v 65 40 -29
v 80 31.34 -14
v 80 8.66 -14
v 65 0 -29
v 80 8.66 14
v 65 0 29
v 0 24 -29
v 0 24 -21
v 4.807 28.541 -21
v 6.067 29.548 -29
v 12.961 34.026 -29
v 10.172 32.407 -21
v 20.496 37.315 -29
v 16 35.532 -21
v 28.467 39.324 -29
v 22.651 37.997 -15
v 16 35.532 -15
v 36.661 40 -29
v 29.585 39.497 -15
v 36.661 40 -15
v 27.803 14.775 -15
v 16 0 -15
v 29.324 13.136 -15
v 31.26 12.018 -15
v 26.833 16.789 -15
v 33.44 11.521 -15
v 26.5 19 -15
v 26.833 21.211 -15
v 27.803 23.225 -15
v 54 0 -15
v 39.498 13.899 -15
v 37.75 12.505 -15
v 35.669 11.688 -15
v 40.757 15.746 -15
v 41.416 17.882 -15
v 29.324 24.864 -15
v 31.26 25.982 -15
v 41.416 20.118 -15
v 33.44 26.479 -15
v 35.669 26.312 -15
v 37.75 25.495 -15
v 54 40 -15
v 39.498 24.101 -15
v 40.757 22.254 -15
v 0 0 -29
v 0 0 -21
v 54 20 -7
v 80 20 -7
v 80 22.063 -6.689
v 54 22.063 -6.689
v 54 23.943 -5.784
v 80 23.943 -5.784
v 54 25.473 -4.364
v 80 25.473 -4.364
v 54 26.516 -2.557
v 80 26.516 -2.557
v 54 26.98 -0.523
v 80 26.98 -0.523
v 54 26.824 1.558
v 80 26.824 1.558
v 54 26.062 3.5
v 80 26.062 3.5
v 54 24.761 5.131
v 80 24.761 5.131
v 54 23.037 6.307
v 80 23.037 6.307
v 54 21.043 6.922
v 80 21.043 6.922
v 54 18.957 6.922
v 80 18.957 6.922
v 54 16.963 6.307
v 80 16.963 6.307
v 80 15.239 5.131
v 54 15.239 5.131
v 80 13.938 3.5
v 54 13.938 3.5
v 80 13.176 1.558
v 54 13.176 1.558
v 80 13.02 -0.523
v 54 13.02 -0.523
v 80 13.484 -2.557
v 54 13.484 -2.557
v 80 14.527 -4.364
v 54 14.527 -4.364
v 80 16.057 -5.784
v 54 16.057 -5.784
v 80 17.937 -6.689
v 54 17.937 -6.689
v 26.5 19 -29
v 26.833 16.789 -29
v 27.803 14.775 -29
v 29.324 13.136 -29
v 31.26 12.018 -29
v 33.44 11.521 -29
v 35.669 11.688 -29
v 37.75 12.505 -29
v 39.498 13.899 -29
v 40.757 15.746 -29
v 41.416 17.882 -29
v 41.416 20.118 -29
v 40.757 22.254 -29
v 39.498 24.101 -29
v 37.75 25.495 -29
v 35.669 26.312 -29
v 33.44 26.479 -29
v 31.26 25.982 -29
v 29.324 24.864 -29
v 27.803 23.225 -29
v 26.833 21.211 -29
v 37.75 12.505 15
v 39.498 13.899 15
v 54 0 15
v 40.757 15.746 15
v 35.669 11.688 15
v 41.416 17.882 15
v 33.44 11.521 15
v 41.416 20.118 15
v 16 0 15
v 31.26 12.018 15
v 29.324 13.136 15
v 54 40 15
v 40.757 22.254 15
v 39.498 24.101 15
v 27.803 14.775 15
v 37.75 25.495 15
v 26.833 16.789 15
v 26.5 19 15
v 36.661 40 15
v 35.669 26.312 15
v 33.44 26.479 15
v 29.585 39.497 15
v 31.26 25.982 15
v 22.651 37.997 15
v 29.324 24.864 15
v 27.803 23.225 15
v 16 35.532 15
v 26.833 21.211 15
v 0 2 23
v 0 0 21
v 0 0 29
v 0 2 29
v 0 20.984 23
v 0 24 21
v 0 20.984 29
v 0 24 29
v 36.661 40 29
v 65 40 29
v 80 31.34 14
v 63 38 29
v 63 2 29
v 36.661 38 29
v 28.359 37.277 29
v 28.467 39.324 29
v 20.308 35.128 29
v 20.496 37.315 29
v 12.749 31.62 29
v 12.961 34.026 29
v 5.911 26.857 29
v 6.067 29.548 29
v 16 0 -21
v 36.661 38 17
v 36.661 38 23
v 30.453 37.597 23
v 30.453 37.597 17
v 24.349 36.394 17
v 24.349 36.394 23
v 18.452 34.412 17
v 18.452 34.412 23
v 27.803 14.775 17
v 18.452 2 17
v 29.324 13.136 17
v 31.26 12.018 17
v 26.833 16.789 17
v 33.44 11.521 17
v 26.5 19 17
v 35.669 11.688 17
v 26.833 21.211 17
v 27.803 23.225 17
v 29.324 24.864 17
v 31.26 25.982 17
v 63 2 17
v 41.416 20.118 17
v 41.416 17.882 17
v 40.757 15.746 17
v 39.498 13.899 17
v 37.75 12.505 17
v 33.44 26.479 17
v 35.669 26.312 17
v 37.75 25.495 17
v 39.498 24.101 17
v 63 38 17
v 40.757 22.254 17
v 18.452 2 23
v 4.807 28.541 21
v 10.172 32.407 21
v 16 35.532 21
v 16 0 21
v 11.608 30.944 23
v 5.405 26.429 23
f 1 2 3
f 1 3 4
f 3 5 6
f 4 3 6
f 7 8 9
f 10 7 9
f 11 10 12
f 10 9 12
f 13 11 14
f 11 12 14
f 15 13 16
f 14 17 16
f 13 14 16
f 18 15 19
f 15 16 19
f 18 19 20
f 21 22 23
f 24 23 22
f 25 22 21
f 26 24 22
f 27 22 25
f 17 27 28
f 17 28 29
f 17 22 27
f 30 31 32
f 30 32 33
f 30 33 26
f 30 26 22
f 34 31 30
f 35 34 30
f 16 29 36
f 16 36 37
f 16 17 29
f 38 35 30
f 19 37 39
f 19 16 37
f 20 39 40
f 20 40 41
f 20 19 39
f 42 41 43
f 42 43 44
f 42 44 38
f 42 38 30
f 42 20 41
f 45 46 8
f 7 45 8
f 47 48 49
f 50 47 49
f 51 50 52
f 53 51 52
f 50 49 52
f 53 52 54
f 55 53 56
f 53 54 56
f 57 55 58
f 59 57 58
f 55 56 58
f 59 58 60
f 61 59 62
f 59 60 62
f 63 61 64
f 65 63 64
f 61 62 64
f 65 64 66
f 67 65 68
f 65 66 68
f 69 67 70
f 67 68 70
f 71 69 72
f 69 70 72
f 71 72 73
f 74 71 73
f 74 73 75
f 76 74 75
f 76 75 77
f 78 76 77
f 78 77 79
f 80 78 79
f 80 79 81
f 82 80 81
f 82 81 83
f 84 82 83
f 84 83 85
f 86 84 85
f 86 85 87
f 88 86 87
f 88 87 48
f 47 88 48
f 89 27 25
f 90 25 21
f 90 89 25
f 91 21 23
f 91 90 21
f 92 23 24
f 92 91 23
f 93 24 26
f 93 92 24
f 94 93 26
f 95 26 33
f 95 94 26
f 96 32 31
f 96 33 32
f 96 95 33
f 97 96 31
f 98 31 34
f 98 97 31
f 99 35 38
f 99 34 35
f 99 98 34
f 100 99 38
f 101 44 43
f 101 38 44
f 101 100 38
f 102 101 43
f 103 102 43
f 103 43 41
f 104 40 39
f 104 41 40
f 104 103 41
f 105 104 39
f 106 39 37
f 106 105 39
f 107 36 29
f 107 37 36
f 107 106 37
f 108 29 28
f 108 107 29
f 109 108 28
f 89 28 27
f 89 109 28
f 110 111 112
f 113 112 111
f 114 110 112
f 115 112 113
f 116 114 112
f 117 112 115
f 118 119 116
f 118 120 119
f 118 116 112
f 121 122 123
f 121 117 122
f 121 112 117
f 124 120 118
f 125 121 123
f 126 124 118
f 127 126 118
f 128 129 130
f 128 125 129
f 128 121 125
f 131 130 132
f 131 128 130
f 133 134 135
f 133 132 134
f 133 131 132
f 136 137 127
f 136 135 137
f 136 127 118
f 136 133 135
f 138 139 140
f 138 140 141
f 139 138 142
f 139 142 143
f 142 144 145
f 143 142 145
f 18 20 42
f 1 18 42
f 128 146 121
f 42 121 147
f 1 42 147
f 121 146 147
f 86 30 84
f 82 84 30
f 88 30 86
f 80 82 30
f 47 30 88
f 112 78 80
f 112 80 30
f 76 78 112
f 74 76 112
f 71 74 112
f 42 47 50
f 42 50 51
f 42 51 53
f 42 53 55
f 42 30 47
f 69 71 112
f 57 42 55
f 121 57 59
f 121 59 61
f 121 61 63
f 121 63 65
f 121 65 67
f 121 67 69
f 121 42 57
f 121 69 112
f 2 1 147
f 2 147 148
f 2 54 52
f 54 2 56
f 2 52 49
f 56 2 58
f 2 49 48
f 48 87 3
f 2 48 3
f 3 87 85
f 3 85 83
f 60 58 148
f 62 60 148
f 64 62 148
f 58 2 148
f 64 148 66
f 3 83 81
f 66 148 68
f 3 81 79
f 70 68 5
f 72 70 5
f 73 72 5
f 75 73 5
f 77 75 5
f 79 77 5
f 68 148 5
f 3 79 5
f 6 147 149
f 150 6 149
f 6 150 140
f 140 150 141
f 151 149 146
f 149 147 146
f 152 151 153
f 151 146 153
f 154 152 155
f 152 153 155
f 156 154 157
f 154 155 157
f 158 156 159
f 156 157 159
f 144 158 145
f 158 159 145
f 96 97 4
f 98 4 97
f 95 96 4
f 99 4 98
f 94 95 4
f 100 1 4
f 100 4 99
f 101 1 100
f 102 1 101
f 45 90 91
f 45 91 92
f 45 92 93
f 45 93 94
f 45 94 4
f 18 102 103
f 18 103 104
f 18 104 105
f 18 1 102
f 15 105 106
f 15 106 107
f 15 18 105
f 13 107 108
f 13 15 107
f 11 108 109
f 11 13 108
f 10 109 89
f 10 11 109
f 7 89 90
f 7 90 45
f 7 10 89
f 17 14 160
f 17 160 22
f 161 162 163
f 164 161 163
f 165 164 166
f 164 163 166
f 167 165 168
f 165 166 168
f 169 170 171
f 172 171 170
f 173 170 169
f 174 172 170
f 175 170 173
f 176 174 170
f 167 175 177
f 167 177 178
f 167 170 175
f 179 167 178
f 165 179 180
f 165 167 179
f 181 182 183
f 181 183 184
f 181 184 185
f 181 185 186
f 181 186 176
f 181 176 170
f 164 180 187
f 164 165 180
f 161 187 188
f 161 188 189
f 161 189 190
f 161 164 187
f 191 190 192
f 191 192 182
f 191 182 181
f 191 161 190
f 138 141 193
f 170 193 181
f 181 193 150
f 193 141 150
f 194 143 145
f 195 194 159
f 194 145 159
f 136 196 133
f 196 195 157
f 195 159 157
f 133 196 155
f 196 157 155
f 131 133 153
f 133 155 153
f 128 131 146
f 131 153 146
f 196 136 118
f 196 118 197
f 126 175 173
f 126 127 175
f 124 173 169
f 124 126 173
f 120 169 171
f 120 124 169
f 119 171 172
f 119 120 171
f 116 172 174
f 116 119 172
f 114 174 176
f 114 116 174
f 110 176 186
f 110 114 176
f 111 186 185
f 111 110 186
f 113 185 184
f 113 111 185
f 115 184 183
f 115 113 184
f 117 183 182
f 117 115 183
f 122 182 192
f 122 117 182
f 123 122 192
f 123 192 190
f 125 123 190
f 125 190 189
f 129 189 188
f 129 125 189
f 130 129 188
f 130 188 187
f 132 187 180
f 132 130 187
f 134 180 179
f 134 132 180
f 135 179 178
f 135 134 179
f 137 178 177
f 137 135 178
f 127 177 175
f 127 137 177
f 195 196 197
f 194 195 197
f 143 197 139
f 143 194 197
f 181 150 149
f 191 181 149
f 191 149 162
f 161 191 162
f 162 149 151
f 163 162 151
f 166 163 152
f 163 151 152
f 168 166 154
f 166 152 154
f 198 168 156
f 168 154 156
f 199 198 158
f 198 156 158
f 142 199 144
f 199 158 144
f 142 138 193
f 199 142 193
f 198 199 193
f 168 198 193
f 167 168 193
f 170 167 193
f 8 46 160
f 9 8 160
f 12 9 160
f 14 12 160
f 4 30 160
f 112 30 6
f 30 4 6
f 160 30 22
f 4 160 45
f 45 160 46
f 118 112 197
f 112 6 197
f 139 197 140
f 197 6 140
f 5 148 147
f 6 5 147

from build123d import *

# Parameters (mm, degrees)
SKETCH2_R           = 7.5
BOSS_EXTRUDE1_DEPTH = 29
CUT_EXTRUDE1_DEPTH  = 95.026591983
SKETCH4_R           = 7
CUT_EXTRUDE2_DEPTH  = 95.026591983
CUT_EXTRUDE5_DEPTH  = 6
CUT_EXTRUDE7_DEPTH  = 6


with BuildPart() as part:
    # Sketch2 → Boss-Extrude1 (new, symmetric)
    with BuildSketch(Plane.XY):
        with BuildLine():
            Line((0, 0), (0, 24))
            ThreePointArc((0, 24), (16.66060556, 35.82575695), (36.66060556, 40))
            Line((36.66060556, 40), (65, 40))
            Line((65, 40), (80, 31.339745962))
            Line((80, 31.339745962), (80, 8.660254038))
            Line((80, 8.660254038), (65, 0))
            Line((65, 0), (0, 0))
        make_face()
        with Locations(Location((34, 19, 0), (0, 0, 180))):
            Circle(SKETCH2_R, mode=Mode.SUBTRACT)
    extrude(amount=BOSS_EXTRUDE1_DEPTH, both=True)

    # Sketch3 → Cut-Extrude1 (cut, through all)
    with BuildSketch(Plane(origin=(0, 40, 0), x_dir=(1, 0, 0), z_dir=(0, 1, 0))):
        Polygon((65, 29), (80, 29), (80, 14), align=None)
        Polygon((0, 21), (16, 21), (16, 15), (54, 15), (54, -15), (16, -15), (16, -21), (0, -21), align=None)
        Polygon((80, -29), (80, -14), (65, -29), align=None)
    extrude(amount=-CUT_EXTRUDE1_DEPTH, mode=Mode.SUBTRACT)

    # Sketch4 → Cut-Extrude2 (cut, through all)
    with BuildSketch(Plane(origin=(80, 0, 0), x_dir=(0, 0, -1), z_dir=(1, 0, 0))):
        with Locations((0, 20)):
            Circle(SKETCH4_R)
    extrude(amount=-CUT_EXTRUDE2_DEPTH, mode=Mode.SUBTRACT)

    # Sketch5 → Cut-Extrude5 (cut)
    with BuildSketch(Plane.XY.offset(29)):
        with BuildLine():
            Line((0, 20.98386677), (0, 2))
            Line((0, 2), (63, 2))
            Line((63, 2), (63, 38))
            Line((63, 38), (36.66060556, 38))
            ThreePointArc((36.66060556, 38), (16.452013389, 33.538635744), (0, 20.98386677))
        make_face()
    extrude(amount=-CUT_EXTRUDE5_DEPTH, mode=Mode.SUBTRACT)

    # Sketch9 → Cut-Extrude7 (cut)
    with BuildSketch(Plane.XY.offset(23)):
        with BuildLine():
            Line((63, 2), (63, 38))
            Line((63, 38), (36.66060556, 38))
            ThreePointArc((36.66060556, 38), (27.381262347, 37.09451974), (18.452013389, 34.412241231))
            Line((18.452013389, 34.412241231), (18.452013389, 2))
            Line((18.452013389, 2), (63, 2))
        make_face()
    extrude(amount=-CUT_EXTRUDE7_DEPTH, mode=Mode.SUBTRACT)


solid = part.part
